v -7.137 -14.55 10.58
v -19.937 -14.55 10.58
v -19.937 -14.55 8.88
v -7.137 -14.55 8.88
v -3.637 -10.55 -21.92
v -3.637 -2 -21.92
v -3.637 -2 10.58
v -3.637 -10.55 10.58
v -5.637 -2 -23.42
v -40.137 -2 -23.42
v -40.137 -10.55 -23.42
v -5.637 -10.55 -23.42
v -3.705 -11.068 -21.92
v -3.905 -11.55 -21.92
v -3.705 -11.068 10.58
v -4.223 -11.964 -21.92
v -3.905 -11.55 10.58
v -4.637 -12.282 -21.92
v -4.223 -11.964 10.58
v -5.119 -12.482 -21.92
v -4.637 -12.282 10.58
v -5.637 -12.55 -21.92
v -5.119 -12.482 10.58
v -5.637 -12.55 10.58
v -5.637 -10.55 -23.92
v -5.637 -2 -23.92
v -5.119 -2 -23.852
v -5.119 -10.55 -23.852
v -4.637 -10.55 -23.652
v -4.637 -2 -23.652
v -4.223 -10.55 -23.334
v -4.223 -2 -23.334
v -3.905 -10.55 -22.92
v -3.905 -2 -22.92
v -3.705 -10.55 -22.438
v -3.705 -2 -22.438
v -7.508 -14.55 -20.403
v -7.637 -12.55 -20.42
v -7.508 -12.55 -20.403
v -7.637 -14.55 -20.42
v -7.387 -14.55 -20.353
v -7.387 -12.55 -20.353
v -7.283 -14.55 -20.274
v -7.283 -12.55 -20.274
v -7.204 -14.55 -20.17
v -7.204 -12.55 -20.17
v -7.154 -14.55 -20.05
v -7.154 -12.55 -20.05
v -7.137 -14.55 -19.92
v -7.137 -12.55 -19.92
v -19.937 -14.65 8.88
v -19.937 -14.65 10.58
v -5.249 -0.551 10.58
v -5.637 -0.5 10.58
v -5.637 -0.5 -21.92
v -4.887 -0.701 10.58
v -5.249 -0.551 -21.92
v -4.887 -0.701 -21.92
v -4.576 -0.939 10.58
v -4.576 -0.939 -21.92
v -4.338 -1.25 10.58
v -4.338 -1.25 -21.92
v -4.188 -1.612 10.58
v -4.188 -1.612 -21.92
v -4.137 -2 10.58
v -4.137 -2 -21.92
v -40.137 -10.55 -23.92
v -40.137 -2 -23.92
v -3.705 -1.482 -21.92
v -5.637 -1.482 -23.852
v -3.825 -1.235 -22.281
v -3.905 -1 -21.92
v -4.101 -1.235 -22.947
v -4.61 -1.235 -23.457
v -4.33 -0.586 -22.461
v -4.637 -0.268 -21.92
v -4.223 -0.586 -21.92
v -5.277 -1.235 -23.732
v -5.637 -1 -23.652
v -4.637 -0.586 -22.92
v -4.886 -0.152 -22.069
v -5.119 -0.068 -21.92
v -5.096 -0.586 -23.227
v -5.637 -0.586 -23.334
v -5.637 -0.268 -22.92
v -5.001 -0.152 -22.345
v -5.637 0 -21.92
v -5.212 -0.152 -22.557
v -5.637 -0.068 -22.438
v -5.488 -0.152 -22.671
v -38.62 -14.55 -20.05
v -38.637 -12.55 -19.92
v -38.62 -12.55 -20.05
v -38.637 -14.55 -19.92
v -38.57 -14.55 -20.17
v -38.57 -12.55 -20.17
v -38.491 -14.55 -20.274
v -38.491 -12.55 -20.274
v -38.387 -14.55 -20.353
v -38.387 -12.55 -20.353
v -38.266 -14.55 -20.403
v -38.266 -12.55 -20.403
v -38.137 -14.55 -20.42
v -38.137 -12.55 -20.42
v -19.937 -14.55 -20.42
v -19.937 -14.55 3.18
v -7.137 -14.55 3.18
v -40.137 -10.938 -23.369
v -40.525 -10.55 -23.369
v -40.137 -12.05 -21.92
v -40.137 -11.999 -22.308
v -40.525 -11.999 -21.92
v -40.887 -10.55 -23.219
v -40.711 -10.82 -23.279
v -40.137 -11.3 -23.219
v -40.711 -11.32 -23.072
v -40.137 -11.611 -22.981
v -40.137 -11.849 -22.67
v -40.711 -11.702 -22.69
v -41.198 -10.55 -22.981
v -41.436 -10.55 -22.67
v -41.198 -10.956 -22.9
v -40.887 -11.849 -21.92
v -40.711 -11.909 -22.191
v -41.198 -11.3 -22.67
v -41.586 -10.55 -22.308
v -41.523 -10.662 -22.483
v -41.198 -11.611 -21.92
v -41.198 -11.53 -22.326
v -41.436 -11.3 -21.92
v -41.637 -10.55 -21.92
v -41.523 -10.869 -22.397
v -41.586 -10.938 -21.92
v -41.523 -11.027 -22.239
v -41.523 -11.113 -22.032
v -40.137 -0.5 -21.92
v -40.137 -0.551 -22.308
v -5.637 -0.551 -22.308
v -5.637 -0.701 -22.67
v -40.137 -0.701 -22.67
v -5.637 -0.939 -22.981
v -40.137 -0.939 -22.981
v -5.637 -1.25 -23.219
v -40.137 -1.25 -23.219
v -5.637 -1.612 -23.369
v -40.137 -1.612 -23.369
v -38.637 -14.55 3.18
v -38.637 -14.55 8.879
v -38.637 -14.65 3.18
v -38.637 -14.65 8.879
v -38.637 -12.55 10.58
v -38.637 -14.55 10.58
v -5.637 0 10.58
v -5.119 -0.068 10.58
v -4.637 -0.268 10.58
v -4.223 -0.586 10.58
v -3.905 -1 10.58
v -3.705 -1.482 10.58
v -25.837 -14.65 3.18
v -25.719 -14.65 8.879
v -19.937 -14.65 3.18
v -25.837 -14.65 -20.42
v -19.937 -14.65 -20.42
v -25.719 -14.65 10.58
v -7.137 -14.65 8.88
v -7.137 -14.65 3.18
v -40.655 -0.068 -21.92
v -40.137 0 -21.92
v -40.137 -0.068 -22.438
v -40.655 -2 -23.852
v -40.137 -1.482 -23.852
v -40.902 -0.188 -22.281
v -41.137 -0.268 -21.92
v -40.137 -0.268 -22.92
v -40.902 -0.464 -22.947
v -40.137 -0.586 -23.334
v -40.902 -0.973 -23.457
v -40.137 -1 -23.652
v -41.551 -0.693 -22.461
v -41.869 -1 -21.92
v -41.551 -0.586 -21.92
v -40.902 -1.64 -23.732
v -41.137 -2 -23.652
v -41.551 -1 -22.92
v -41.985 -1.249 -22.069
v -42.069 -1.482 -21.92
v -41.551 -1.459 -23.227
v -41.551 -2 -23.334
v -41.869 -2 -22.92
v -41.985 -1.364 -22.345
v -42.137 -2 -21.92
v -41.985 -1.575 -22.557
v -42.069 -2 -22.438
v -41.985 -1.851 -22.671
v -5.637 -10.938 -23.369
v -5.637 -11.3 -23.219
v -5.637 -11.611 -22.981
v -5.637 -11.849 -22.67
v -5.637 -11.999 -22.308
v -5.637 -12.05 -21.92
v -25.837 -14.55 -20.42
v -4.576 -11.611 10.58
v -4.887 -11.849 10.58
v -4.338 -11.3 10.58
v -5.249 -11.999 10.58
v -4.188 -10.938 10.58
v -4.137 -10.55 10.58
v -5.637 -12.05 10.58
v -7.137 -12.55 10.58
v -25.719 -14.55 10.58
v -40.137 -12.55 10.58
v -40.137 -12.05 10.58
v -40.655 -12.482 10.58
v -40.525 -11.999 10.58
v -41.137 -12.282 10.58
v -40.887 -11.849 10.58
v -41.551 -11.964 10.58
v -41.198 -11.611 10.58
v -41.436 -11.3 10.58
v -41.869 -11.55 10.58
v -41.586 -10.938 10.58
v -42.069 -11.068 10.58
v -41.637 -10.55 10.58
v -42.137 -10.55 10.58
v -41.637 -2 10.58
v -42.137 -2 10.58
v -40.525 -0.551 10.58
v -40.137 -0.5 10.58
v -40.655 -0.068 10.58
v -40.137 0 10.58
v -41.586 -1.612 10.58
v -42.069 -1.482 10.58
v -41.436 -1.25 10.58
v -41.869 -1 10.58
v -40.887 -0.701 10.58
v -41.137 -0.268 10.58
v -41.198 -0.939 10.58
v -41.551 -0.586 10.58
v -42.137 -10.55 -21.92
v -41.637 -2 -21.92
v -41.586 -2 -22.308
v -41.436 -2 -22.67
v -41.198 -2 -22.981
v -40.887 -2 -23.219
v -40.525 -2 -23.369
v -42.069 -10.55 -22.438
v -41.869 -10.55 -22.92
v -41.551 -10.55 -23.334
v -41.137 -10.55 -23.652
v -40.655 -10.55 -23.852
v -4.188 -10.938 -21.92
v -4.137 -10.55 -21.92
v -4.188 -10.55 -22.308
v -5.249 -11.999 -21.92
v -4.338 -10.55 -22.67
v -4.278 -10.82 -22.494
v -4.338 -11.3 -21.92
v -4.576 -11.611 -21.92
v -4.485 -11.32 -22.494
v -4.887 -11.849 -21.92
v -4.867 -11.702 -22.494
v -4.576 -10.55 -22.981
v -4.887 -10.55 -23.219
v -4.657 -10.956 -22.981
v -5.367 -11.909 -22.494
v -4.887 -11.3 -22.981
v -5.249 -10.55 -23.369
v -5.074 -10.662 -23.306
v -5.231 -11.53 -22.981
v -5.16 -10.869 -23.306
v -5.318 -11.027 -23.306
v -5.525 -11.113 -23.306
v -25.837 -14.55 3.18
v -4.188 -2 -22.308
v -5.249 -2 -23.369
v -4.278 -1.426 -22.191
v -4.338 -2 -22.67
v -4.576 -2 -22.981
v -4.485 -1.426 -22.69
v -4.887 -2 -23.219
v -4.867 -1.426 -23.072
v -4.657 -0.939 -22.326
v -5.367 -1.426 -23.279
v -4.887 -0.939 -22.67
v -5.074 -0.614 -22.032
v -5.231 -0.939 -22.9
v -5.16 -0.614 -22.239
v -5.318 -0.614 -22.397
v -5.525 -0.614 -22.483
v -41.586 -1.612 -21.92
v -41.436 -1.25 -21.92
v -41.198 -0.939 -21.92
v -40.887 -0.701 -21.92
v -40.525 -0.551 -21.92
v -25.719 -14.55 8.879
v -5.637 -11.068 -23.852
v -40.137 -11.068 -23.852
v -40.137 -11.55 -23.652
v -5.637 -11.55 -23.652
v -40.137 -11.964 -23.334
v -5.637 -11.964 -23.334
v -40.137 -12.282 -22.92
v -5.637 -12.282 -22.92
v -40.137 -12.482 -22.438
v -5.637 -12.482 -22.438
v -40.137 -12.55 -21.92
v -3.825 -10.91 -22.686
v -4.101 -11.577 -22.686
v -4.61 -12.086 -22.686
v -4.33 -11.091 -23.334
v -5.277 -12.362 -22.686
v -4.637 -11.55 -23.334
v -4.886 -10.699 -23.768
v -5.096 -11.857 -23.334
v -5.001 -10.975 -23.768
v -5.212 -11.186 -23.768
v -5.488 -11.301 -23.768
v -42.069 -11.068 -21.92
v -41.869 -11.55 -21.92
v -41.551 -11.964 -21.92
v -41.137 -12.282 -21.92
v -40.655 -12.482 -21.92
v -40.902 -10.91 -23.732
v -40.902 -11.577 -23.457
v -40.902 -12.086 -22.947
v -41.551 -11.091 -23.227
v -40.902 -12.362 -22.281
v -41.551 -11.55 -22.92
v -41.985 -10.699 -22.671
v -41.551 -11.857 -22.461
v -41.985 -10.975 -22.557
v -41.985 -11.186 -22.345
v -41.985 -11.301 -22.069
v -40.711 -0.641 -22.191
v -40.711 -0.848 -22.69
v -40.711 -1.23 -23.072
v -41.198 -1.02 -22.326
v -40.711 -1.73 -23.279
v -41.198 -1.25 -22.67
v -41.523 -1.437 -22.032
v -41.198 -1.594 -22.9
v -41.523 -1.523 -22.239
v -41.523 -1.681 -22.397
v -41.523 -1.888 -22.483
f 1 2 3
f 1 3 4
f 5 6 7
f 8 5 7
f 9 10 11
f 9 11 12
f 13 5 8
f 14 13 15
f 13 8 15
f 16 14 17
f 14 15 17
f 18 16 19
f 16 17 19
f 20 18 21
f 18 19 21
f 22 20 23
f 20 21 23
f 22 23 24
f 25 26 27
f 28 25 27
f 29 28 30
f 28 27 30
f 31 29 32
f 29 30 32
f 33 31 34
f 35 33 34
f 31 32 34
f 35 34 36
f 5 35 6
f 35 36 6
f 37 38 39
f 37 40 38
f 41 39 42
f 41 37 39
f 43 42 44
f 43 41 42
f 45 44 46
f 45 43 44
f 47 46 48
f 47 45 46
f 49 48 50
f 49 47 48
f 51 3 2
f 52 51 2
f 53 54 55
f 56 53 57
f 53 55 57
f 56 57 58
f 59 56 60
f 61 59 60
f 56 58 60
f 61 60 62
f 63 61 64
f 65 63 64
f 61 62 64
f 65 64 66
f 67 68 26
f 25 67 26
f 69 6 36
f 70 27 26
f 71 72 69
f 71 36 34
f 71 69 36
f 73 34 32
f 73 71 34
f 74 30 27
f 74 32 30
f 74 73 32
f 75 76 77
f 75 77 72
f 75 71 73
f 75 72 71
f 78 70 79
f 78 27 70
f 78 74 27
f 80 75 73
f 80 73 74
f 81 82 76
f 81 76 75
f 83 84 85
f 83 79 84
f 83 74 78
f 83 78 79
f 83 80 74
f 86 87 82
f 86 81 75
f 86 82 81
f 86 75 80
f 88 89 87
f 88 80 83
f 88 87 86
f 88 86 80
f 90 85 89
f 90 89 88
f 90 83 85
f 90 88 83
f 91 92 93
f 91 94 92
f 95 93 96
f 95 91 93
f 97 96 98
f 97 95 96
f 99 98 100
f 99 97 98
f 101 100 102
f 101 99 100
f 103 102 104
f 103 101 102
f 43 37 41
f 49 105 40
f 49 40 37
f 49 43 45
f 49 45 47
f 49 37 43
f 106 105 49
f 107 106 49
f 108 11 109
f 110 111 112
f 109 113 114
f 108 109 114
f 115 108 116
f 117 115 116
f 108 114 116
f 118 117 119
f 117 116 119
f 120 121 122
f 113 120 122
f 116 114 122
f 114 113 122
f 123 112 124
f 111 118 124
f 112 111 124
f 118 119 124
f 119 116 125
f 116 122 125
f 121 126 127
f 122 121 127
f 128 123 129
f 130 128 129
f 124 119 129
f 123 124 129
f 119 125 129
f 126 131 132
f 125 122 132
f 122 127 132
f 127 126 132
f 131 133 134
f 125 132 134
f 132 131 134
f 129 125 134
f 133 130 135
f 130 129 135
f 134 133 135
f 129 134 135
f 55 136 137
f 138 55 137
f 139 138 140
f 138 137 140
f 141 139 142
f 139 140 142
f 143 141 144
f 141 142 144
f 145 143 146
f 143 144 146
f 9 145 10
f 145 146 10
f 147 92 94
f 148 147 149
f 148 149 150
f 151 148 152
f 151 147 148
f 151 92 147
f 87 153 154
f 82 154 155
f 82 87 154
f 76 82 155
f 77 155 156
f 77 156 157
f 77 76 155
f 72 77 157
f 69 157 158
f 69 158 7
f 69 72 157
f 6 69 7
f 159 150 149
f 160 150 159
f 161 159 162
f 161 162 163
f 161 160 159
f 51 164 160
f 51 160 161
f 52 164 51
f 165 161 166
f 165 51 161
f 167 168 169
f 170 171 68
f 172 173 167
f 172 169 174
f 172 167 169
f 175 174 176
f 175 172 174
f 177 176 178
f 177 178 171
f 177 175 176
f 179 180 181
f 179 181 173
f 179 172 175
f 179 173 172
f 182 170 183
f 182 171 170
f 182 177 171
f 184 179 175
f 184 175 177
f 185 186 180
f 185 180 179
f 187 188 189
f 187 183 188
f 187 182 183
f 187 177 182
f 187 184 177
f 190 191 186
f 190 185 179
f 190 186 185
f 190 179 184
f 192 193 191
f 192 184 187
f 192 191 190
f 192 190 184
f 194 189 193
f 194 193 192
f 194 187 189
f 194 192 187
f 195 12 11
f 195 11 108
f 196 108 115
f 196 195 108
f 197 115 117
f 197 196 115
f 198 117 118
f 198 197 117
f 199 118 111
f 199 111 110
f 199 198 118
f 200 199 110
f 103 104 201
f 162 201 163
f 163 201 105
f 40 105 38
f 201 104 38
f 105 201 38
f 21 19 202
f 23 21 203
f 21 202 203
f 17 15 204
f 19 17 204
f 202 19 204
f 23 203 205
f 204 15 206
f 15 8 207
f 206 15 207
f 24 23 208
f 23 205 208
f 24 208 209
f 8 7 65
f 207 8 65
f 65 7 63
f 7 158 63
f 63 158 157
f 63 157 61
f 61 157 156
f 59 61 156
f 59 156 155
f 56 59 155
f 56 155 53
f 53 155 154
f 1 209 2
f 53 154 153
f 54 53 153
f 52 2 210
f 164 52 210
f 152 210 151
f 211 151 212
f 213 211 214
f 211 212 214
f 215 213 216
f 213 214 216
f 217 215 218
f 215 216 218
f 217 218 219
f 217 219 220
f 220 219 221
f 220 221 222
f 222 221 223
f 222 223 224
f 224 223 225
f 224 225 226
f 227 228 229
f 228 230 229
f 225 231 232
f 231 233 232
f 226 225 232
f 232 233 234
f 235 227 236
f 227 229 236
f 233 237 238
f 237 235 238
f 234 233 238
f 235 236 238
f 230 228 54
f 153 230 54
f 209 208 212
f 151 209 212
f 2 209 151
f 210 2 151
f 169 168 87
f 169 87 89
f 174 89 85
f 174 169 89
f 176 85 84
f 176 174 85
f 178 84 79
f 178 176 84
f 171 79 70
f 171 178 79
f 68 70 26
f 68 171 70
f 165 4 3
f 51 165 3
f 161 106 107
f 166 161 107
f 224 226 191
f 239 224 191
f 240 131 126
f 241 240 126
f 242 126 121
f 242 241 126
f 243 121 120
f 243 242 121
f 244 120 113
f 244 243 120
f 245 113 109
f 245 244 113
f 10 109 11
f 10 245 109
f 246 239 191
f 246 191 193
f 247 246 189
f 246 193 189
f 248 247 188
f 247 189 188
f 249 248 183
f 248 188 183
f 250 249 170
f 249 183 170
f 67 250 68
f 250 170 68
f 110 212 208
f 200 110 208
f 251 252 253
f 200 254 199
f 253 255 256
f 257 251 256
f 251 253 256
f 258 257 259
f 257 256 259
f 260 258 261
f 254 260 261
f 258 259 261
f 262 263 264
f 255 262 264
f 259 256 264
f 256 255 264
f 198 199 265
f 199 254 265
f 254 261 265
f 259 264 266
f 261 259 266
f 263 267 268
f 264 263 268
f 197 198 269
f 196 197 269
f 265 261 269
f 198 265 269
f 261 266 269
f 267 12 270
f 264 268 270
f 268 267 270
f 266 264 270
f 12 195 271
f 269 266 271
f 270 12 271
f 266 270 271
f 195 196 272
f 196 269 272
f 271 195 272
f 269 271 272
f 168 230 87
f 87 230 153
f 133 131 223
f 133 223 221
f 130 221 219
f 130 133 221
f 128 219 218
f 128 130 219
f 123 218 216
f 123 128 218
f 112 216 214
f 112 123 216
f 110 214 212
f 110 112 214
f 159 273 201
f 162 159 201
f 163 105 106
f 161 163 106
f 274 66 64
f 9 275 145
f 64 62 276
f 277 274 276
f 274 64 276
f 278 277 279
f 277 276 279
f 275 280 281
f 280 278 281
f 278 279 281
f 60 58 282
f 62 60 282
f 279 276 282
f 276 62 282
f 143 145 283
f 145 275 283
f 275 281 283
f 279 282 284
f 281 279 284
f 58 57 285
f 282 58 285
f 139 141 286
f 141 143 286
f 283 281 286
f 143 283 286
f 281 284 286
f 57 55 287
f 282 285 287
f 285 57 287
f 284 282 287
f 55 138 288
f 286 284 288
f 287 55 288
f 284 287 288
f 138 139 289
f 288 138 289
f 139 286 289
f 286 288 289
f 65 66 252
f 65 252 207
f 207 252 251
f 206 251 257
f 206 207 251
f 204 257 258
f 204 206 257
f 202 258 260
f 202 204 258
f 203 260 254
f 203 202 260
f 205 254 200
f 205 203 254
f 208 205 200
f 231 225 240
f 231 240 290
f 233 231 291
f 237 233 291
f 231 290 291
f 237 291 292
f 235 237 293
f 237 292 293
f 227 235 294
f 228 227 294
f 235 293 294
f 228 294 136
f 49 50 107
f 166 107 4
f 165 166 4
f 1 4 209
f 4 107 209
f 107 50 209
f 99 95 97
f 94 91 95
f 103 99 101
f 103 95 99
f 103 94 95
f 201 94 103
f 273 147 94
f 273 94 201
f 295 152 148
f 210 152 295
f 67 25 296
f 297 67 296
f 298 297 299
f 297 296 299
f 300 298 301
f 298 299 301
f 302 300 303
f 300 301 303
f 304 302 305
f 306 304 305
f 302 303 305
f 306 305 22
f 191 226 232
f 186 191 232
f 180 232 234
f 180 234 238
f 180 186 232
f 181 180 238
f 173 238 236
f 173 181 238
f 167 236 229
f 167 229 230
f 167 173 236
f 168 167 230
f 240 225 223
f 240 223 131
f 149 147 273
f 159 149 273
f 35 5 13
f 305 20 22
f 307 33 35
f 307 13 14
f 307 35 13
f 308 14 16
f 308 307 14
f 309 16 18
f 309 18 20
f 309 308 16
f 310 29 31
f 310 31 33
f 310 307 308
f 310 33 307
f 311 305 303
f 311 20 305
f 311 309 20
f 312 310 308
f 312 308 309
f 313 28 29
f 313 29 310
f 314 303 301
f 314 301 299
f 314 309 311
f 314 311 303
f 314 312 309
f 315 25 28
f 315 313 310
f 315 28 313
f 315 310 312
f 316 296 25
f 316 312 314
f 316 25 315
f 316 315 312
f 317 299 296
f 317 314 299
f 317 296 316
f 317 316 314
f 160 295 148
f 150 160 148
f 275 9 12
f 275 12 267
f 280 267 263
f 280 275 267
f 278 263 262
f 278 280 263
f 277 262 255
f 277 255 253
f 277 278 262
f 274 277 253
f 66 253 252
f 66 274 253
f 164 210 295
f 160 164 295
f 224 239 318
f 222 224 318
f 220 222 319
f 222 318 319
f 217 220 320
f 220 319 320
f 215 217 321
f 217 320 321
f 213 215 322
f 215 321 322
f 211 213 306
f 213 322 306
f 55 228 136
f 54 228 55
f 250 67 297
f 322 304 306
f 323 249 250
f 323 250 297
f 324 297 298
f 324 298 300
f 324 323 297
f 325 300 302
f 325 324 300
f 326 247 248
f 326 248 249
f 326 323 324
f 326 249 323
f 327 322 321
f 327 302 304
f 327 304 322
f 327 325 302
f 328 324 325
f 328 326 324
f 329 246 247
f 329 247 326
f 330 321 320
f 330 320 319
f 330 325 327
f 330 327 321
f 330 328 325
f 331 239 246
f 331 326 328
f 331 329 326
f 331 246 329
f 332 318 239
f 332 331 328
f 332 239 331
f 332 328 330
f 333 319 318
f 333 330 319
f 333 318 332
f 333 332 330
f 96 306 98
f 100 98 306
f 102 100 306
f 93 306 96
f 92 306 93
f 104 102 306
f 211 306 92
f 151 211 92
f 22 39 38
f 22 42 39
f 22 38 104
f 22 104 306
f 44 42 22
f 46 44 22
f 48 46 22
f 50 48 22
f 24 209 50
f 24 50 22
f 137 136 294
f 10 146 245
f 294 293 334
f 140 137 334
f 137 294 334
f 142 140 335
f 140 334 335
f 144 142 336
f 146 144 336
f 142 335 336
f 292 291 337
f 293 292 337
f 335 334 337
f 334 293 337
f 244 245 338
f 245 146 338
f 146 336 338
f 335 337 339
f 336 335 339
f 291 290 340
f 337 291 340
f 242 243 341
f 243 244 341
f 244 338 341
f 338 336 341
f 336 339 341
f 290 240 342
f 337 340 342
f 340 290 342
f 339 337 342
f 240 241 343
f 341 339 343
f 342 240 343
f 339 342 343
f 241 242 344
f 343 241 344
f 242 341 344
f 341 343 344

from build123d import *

# Parameters (mm, degrees)
F1_DEPTH     = 12.55
F2_R         = 2
F3_T1_DEPTH  = 37.5
F3_T3_DEPTH  = 8.55
F3_T5_DEPTH  = 34.5
F3_S9_W      = 2
F3_S9_H      = 2
F3_T10_DEPTH = 2
F3_S15_W     = 2
F3_S15_H     = 2
F3_T16_DEPTH = 2
F3_S21_W     = 2
F3_S21_H     = 2
F3_T22_DEPTH = 2
F3_S27_W     = 2
F3_S27_H     = 2
F3_T28_DEPTH = 2
F4_T         = -0.5
F6_W         = 31.5
F6_H         = 31
F7_DEPTH     = 2
F8_R         = 0.5
F10_DEPTH    = 0.1


# Not quite as in the source:
# - a fillet or chamfer that OpenCascade refuses, or shapes differently, is made with other operations: its cross-section is extruded or revolved along the edge and cut away or added


with BuildPart() as f1:
    # F0 (on Front) → F1 (new body)
    with BuildSketch(Plane.XZ):
        Polygon((-42.1370128049, 10.5798164573), (-42.1370128049, -23.9201835427), (-3.6370128049, -23.9201835427), (-3.6370128049, 10.5798164573), (-8.2607226698, 10.5798164573), (-39.5151264966, 10.5798164573), (-39.6370128049, 10.5798164573), align=None)
    extrude(amount=F1_DEPTH)

    # F2
    f2_edges = [f1.edges().sort_by_distance(p)[0] for p in [
        (-42.137013, -12.55, -6.670184),
        (-22.887013, -12.55, -23.920184),
        (-3.637013, -12.55, -6.670184),
    ]]
    fillet(f2_edges, radius=F2_R)

    # F3: fillet of radius 2 on 5 edges, made by hand

    # F3_s2 → F3_t1 (cut)
    with BuildSketch(Plane.XY.offset(-21.9201835427)):
        with BuildLine():
            ThreePointArc((-42.1370128049, -2), (-41.5512263672, -0.5857864376), (-40.1370128049, 0))
            Line((-40.1370128049, 0), (-42.1370128049, 0))
            Line((-42.1370128049, 0), (-42.1370128049, -2))
        make_face()
        with BuildLine():
            ThreePointArc((-5.6370128049, 0), (-4.2227992425, -0.5857864376), (-3.6370128049, -2))
            Line((-3.6370128049, -2), (-3.6370128049, 0))
            Line((-3.6370128049, 0), (-5.6370128049, 0))
        make_face()
    extrude(amount=F3_T1_DEPTH, mode=Mode.SUBTRACT)

    # F3_s4 → F3_t3 (cut)
    with BuildSketch(Plane.XZ.offset(2)):
        with BuildLine():
            ThreePointArc((-5.6370128049, -23.9201835427), (-4.2227992425, -23.3343971051), (-3.6370128049, -21.9201835427))
            Line((-3.6370128049, -21.9201835427), (-3.6370128049, -23.9201835427))
            Line((-3.6370128049, -23.9201835427), (-5.6370128049, -23.9201835427))
        make_face()
        with BuildLine():
            ThreePointArc((-42.1370128049, -21.9201835427), (-41.5512263672, -23.3343971051), (-40.1370128049, -23.9201835427))
            Line((-40.1370128049, -23.9201835427), (-42.1370128049, -23.9201835427))
            Line((-42.1370128049, -23.9201835427), (-42.1370128049, -21.9201835427))
        make_face()
    extrude(amount=F3_T3_DEPTH, mode=Mode.SUBTRACT)

    # F3_s6 → F3_t5 (cut)
    with BuildSketch(Plane.YZ.offset(-40.1370128049)):
        with BuildLine():
            ThreePointArc((0, -21.9201835427), (-0.5857864376, -23.3343971051), (-2, -23.9201835427))
            Line((-2, -23.9201835427), (0, -23.9201835427))
            Line((0, -23.9201835427), (0, -21.9201835427))
        make_face()
    extrude(amount=F3_T5_DEPTH, mode=Mode.SUBTRACT)


with BuildPart() as f3_tool8:
    # F3_s9 → F3_t10 (new body)
    with BuildSketch(Plane.YZ.offset(-40.1370128049)):
        with Locations((-11.55, -22.9201835427)):
            Rectangle(F3_S9_W, F3_S9_H)
    extrude(amount=-F3_T10_DEPTH)

    # F3_s11 → F3_t12 (revolve, cut)
    with BuildSketch(Plane(origin=(-40.1370128049, -10.55, -21.9201835427), x_dir=(0, 0.7071067812, 0.7071067812), z_dir=(0, -0.7071067812, 0.7071067812))):
        with BuildLine():
            ThreePointArc((0, -2), (2, 0), (0, 2))
            Line((0, 2), (0, -2))
        make_face()
    revolve(axis=Axis((-40.1370128049, -10.55, -21.9201835427), (-1, 0, 0)), mode=Mode.SUBTRACT)


with BuildPart() as f1_1:
    add(f1.part)

    # F3_t7: cut F3_tool8
    add(f3_tool8.part, mode=Mode.SUBTRACT)


with BuildPart() as f3_tool14:
    # F3_s15 → F3_t16 (new body)
    with BuildSketch(Plane.XY.offset(-21.9201835427)):
        with Locations((-4.6370128049, -11.55)):
            Rectangle(F3_S15_W, F3_S15_H)
    extrude(amount=-F3_T16_DEPTH)

    # F3_s17 → F3_t18 (revolve, cut)
    with BuildSketch(Plane(origin=(-5.6370128049, -10.55, -21.9201835427), x_dir=(-0.7071067812, 0.7071067812, 0), z_dir=(-0.7071067812, -0.7071067812, 0))):
        with BuildLine():
            ThreePointArc((0, -2), (2, 0), (0, 2))
            Line((0, 2), (0, -2))
        make_face()
    revolve(axis=Axis((-5.6370128049, -10.55, -21.9201835427), (0, 0, -1)), mode=Mode.SUBTRACT)


with BuildPart() as f1_2:
    add(f1_1.part)

    # F3_t13: cut F3_tool14
    add(f3_tool14.part, mode=Mode.SUBTRACT)


with BuildPart() as f3_tool20:
    # F3_s21 → F3_t22 (new body)
    with BuildSketch(Plane.YZ.offset(-40.1370128049)):
        with Locations((-1, -22.9201835427)):
            Rectangle(F3_S21_W, F3_S21_H)
    extrude(amount=-F3_T22_DEPTH)

    # F3_s23 → F3_t24 (revolve, cut)
    with BuildSketch(Plane(origin=(-40.1370128049, -2, -21.9201835427), x_dir=(0, -0.7071067812, 0.7071067812), z_dir=(0, -0.7071067812, -0.7071067812))):
        with BuildLine():
            ThreePointArc((0, -2), (2, 0), (0, 2))
            Line((0, 2), (0, -2))
        make_face()
    revolve(axis=Axis((-40.1370128049, -2, -21.9201835427), (-1, 0, 0)), mode=Mode.SUBTRACT)


with BuildPart() as f1_3:
    add(f1_2.part)

    # F3_t19: cut F3_tool20
    add(f3_tool20.part, mode=Mode.SUBTRACT)


with BuildPart() as f3_tool26:
    # F3_s27 → F3_t28 (new body)
    with BuildSketch(Plane.XZ.offset(2)):
        with Locations((-4.6370128049, -22.9201835427)):
            Rectangle(F3_S27_W, F3_S27_H)
    extrude(amount=-F3_T28_DEPTH)

    # F3_s29 → F3_t30 (revolve, cut)
    with BuildSketch(Plane(origin=(-5.6370128049, -2, -21.9201835427), x_dir=(-0.7071067812, 0, 0.7071067812), z_dir=(-0.7071067812, 0, -0.7071067812))):
        with BuildLine():
            ThreePointArc((0, -2), (2, 0), (0, 2))
            Line((0, 2), (0, -2))
        make_face()
    revolve(axis=Axis((-5.6370128049, -2, -21.9201835427), (0, 1, 0)), mode=Mode.SUBTRACT)


with BuildPart() as f1_4:
    add(f1_3.part)

    # F3_t25: cut F3_tool26
    add(f3_tool26.part, mode=Mode.SUBTRACT)

    # F4
    f4_openings = [f1_4.faces().sort_by_distance(p)[0] for p in [
        (-22.887013, -6.275, 10.579816),
    ]]
    offset(amount=F4_T, openings=f4_openings)

    # F6 (on offset) → F7 (join)
    with BuildSketch(Plane.XZ.offset(12.55)):
        with Locations((-22.8870128049, -4.9201835427)):
            Rectangle(F6_W, F6_H)
    extrude(amount=F7_DEPTH)

    # F8
    f8_edges = [f1_4.edges().sort_by_distance(p)[0] for p in [
        (-38.637013, -13.55, -20.420184),
        (-7.137013, -13.55, -20.420184),
    ]]
    fillet(f8_edges, radius=F8_R)

    # F9 (on face) → F10 (join)
    with BuildSketch(Plane.XZ.offset(14.55)):
        Polygon((-25.7187689085, 8.8785898675), (-38.6370128049, 8.8785898675), (-38.6370128049, 3.1798164573), (-25.8370128049, 3.1798164573), (-25.8370128049, -20.4201835427), (-19.9370128049, -20.4201835427), (-19.9370128049, 3.1798164573), (-7.1370128049, 3.1798164573), (-7.1370128049, 8.8798164573), (-19.9370128049, 8.8798164573), (-19.9370128049, 10.5798164573), (-25.7187689085, 10.5798164573), align=None)
    extrude(amount=F10_DEPTH)


solid = f1_4.part
